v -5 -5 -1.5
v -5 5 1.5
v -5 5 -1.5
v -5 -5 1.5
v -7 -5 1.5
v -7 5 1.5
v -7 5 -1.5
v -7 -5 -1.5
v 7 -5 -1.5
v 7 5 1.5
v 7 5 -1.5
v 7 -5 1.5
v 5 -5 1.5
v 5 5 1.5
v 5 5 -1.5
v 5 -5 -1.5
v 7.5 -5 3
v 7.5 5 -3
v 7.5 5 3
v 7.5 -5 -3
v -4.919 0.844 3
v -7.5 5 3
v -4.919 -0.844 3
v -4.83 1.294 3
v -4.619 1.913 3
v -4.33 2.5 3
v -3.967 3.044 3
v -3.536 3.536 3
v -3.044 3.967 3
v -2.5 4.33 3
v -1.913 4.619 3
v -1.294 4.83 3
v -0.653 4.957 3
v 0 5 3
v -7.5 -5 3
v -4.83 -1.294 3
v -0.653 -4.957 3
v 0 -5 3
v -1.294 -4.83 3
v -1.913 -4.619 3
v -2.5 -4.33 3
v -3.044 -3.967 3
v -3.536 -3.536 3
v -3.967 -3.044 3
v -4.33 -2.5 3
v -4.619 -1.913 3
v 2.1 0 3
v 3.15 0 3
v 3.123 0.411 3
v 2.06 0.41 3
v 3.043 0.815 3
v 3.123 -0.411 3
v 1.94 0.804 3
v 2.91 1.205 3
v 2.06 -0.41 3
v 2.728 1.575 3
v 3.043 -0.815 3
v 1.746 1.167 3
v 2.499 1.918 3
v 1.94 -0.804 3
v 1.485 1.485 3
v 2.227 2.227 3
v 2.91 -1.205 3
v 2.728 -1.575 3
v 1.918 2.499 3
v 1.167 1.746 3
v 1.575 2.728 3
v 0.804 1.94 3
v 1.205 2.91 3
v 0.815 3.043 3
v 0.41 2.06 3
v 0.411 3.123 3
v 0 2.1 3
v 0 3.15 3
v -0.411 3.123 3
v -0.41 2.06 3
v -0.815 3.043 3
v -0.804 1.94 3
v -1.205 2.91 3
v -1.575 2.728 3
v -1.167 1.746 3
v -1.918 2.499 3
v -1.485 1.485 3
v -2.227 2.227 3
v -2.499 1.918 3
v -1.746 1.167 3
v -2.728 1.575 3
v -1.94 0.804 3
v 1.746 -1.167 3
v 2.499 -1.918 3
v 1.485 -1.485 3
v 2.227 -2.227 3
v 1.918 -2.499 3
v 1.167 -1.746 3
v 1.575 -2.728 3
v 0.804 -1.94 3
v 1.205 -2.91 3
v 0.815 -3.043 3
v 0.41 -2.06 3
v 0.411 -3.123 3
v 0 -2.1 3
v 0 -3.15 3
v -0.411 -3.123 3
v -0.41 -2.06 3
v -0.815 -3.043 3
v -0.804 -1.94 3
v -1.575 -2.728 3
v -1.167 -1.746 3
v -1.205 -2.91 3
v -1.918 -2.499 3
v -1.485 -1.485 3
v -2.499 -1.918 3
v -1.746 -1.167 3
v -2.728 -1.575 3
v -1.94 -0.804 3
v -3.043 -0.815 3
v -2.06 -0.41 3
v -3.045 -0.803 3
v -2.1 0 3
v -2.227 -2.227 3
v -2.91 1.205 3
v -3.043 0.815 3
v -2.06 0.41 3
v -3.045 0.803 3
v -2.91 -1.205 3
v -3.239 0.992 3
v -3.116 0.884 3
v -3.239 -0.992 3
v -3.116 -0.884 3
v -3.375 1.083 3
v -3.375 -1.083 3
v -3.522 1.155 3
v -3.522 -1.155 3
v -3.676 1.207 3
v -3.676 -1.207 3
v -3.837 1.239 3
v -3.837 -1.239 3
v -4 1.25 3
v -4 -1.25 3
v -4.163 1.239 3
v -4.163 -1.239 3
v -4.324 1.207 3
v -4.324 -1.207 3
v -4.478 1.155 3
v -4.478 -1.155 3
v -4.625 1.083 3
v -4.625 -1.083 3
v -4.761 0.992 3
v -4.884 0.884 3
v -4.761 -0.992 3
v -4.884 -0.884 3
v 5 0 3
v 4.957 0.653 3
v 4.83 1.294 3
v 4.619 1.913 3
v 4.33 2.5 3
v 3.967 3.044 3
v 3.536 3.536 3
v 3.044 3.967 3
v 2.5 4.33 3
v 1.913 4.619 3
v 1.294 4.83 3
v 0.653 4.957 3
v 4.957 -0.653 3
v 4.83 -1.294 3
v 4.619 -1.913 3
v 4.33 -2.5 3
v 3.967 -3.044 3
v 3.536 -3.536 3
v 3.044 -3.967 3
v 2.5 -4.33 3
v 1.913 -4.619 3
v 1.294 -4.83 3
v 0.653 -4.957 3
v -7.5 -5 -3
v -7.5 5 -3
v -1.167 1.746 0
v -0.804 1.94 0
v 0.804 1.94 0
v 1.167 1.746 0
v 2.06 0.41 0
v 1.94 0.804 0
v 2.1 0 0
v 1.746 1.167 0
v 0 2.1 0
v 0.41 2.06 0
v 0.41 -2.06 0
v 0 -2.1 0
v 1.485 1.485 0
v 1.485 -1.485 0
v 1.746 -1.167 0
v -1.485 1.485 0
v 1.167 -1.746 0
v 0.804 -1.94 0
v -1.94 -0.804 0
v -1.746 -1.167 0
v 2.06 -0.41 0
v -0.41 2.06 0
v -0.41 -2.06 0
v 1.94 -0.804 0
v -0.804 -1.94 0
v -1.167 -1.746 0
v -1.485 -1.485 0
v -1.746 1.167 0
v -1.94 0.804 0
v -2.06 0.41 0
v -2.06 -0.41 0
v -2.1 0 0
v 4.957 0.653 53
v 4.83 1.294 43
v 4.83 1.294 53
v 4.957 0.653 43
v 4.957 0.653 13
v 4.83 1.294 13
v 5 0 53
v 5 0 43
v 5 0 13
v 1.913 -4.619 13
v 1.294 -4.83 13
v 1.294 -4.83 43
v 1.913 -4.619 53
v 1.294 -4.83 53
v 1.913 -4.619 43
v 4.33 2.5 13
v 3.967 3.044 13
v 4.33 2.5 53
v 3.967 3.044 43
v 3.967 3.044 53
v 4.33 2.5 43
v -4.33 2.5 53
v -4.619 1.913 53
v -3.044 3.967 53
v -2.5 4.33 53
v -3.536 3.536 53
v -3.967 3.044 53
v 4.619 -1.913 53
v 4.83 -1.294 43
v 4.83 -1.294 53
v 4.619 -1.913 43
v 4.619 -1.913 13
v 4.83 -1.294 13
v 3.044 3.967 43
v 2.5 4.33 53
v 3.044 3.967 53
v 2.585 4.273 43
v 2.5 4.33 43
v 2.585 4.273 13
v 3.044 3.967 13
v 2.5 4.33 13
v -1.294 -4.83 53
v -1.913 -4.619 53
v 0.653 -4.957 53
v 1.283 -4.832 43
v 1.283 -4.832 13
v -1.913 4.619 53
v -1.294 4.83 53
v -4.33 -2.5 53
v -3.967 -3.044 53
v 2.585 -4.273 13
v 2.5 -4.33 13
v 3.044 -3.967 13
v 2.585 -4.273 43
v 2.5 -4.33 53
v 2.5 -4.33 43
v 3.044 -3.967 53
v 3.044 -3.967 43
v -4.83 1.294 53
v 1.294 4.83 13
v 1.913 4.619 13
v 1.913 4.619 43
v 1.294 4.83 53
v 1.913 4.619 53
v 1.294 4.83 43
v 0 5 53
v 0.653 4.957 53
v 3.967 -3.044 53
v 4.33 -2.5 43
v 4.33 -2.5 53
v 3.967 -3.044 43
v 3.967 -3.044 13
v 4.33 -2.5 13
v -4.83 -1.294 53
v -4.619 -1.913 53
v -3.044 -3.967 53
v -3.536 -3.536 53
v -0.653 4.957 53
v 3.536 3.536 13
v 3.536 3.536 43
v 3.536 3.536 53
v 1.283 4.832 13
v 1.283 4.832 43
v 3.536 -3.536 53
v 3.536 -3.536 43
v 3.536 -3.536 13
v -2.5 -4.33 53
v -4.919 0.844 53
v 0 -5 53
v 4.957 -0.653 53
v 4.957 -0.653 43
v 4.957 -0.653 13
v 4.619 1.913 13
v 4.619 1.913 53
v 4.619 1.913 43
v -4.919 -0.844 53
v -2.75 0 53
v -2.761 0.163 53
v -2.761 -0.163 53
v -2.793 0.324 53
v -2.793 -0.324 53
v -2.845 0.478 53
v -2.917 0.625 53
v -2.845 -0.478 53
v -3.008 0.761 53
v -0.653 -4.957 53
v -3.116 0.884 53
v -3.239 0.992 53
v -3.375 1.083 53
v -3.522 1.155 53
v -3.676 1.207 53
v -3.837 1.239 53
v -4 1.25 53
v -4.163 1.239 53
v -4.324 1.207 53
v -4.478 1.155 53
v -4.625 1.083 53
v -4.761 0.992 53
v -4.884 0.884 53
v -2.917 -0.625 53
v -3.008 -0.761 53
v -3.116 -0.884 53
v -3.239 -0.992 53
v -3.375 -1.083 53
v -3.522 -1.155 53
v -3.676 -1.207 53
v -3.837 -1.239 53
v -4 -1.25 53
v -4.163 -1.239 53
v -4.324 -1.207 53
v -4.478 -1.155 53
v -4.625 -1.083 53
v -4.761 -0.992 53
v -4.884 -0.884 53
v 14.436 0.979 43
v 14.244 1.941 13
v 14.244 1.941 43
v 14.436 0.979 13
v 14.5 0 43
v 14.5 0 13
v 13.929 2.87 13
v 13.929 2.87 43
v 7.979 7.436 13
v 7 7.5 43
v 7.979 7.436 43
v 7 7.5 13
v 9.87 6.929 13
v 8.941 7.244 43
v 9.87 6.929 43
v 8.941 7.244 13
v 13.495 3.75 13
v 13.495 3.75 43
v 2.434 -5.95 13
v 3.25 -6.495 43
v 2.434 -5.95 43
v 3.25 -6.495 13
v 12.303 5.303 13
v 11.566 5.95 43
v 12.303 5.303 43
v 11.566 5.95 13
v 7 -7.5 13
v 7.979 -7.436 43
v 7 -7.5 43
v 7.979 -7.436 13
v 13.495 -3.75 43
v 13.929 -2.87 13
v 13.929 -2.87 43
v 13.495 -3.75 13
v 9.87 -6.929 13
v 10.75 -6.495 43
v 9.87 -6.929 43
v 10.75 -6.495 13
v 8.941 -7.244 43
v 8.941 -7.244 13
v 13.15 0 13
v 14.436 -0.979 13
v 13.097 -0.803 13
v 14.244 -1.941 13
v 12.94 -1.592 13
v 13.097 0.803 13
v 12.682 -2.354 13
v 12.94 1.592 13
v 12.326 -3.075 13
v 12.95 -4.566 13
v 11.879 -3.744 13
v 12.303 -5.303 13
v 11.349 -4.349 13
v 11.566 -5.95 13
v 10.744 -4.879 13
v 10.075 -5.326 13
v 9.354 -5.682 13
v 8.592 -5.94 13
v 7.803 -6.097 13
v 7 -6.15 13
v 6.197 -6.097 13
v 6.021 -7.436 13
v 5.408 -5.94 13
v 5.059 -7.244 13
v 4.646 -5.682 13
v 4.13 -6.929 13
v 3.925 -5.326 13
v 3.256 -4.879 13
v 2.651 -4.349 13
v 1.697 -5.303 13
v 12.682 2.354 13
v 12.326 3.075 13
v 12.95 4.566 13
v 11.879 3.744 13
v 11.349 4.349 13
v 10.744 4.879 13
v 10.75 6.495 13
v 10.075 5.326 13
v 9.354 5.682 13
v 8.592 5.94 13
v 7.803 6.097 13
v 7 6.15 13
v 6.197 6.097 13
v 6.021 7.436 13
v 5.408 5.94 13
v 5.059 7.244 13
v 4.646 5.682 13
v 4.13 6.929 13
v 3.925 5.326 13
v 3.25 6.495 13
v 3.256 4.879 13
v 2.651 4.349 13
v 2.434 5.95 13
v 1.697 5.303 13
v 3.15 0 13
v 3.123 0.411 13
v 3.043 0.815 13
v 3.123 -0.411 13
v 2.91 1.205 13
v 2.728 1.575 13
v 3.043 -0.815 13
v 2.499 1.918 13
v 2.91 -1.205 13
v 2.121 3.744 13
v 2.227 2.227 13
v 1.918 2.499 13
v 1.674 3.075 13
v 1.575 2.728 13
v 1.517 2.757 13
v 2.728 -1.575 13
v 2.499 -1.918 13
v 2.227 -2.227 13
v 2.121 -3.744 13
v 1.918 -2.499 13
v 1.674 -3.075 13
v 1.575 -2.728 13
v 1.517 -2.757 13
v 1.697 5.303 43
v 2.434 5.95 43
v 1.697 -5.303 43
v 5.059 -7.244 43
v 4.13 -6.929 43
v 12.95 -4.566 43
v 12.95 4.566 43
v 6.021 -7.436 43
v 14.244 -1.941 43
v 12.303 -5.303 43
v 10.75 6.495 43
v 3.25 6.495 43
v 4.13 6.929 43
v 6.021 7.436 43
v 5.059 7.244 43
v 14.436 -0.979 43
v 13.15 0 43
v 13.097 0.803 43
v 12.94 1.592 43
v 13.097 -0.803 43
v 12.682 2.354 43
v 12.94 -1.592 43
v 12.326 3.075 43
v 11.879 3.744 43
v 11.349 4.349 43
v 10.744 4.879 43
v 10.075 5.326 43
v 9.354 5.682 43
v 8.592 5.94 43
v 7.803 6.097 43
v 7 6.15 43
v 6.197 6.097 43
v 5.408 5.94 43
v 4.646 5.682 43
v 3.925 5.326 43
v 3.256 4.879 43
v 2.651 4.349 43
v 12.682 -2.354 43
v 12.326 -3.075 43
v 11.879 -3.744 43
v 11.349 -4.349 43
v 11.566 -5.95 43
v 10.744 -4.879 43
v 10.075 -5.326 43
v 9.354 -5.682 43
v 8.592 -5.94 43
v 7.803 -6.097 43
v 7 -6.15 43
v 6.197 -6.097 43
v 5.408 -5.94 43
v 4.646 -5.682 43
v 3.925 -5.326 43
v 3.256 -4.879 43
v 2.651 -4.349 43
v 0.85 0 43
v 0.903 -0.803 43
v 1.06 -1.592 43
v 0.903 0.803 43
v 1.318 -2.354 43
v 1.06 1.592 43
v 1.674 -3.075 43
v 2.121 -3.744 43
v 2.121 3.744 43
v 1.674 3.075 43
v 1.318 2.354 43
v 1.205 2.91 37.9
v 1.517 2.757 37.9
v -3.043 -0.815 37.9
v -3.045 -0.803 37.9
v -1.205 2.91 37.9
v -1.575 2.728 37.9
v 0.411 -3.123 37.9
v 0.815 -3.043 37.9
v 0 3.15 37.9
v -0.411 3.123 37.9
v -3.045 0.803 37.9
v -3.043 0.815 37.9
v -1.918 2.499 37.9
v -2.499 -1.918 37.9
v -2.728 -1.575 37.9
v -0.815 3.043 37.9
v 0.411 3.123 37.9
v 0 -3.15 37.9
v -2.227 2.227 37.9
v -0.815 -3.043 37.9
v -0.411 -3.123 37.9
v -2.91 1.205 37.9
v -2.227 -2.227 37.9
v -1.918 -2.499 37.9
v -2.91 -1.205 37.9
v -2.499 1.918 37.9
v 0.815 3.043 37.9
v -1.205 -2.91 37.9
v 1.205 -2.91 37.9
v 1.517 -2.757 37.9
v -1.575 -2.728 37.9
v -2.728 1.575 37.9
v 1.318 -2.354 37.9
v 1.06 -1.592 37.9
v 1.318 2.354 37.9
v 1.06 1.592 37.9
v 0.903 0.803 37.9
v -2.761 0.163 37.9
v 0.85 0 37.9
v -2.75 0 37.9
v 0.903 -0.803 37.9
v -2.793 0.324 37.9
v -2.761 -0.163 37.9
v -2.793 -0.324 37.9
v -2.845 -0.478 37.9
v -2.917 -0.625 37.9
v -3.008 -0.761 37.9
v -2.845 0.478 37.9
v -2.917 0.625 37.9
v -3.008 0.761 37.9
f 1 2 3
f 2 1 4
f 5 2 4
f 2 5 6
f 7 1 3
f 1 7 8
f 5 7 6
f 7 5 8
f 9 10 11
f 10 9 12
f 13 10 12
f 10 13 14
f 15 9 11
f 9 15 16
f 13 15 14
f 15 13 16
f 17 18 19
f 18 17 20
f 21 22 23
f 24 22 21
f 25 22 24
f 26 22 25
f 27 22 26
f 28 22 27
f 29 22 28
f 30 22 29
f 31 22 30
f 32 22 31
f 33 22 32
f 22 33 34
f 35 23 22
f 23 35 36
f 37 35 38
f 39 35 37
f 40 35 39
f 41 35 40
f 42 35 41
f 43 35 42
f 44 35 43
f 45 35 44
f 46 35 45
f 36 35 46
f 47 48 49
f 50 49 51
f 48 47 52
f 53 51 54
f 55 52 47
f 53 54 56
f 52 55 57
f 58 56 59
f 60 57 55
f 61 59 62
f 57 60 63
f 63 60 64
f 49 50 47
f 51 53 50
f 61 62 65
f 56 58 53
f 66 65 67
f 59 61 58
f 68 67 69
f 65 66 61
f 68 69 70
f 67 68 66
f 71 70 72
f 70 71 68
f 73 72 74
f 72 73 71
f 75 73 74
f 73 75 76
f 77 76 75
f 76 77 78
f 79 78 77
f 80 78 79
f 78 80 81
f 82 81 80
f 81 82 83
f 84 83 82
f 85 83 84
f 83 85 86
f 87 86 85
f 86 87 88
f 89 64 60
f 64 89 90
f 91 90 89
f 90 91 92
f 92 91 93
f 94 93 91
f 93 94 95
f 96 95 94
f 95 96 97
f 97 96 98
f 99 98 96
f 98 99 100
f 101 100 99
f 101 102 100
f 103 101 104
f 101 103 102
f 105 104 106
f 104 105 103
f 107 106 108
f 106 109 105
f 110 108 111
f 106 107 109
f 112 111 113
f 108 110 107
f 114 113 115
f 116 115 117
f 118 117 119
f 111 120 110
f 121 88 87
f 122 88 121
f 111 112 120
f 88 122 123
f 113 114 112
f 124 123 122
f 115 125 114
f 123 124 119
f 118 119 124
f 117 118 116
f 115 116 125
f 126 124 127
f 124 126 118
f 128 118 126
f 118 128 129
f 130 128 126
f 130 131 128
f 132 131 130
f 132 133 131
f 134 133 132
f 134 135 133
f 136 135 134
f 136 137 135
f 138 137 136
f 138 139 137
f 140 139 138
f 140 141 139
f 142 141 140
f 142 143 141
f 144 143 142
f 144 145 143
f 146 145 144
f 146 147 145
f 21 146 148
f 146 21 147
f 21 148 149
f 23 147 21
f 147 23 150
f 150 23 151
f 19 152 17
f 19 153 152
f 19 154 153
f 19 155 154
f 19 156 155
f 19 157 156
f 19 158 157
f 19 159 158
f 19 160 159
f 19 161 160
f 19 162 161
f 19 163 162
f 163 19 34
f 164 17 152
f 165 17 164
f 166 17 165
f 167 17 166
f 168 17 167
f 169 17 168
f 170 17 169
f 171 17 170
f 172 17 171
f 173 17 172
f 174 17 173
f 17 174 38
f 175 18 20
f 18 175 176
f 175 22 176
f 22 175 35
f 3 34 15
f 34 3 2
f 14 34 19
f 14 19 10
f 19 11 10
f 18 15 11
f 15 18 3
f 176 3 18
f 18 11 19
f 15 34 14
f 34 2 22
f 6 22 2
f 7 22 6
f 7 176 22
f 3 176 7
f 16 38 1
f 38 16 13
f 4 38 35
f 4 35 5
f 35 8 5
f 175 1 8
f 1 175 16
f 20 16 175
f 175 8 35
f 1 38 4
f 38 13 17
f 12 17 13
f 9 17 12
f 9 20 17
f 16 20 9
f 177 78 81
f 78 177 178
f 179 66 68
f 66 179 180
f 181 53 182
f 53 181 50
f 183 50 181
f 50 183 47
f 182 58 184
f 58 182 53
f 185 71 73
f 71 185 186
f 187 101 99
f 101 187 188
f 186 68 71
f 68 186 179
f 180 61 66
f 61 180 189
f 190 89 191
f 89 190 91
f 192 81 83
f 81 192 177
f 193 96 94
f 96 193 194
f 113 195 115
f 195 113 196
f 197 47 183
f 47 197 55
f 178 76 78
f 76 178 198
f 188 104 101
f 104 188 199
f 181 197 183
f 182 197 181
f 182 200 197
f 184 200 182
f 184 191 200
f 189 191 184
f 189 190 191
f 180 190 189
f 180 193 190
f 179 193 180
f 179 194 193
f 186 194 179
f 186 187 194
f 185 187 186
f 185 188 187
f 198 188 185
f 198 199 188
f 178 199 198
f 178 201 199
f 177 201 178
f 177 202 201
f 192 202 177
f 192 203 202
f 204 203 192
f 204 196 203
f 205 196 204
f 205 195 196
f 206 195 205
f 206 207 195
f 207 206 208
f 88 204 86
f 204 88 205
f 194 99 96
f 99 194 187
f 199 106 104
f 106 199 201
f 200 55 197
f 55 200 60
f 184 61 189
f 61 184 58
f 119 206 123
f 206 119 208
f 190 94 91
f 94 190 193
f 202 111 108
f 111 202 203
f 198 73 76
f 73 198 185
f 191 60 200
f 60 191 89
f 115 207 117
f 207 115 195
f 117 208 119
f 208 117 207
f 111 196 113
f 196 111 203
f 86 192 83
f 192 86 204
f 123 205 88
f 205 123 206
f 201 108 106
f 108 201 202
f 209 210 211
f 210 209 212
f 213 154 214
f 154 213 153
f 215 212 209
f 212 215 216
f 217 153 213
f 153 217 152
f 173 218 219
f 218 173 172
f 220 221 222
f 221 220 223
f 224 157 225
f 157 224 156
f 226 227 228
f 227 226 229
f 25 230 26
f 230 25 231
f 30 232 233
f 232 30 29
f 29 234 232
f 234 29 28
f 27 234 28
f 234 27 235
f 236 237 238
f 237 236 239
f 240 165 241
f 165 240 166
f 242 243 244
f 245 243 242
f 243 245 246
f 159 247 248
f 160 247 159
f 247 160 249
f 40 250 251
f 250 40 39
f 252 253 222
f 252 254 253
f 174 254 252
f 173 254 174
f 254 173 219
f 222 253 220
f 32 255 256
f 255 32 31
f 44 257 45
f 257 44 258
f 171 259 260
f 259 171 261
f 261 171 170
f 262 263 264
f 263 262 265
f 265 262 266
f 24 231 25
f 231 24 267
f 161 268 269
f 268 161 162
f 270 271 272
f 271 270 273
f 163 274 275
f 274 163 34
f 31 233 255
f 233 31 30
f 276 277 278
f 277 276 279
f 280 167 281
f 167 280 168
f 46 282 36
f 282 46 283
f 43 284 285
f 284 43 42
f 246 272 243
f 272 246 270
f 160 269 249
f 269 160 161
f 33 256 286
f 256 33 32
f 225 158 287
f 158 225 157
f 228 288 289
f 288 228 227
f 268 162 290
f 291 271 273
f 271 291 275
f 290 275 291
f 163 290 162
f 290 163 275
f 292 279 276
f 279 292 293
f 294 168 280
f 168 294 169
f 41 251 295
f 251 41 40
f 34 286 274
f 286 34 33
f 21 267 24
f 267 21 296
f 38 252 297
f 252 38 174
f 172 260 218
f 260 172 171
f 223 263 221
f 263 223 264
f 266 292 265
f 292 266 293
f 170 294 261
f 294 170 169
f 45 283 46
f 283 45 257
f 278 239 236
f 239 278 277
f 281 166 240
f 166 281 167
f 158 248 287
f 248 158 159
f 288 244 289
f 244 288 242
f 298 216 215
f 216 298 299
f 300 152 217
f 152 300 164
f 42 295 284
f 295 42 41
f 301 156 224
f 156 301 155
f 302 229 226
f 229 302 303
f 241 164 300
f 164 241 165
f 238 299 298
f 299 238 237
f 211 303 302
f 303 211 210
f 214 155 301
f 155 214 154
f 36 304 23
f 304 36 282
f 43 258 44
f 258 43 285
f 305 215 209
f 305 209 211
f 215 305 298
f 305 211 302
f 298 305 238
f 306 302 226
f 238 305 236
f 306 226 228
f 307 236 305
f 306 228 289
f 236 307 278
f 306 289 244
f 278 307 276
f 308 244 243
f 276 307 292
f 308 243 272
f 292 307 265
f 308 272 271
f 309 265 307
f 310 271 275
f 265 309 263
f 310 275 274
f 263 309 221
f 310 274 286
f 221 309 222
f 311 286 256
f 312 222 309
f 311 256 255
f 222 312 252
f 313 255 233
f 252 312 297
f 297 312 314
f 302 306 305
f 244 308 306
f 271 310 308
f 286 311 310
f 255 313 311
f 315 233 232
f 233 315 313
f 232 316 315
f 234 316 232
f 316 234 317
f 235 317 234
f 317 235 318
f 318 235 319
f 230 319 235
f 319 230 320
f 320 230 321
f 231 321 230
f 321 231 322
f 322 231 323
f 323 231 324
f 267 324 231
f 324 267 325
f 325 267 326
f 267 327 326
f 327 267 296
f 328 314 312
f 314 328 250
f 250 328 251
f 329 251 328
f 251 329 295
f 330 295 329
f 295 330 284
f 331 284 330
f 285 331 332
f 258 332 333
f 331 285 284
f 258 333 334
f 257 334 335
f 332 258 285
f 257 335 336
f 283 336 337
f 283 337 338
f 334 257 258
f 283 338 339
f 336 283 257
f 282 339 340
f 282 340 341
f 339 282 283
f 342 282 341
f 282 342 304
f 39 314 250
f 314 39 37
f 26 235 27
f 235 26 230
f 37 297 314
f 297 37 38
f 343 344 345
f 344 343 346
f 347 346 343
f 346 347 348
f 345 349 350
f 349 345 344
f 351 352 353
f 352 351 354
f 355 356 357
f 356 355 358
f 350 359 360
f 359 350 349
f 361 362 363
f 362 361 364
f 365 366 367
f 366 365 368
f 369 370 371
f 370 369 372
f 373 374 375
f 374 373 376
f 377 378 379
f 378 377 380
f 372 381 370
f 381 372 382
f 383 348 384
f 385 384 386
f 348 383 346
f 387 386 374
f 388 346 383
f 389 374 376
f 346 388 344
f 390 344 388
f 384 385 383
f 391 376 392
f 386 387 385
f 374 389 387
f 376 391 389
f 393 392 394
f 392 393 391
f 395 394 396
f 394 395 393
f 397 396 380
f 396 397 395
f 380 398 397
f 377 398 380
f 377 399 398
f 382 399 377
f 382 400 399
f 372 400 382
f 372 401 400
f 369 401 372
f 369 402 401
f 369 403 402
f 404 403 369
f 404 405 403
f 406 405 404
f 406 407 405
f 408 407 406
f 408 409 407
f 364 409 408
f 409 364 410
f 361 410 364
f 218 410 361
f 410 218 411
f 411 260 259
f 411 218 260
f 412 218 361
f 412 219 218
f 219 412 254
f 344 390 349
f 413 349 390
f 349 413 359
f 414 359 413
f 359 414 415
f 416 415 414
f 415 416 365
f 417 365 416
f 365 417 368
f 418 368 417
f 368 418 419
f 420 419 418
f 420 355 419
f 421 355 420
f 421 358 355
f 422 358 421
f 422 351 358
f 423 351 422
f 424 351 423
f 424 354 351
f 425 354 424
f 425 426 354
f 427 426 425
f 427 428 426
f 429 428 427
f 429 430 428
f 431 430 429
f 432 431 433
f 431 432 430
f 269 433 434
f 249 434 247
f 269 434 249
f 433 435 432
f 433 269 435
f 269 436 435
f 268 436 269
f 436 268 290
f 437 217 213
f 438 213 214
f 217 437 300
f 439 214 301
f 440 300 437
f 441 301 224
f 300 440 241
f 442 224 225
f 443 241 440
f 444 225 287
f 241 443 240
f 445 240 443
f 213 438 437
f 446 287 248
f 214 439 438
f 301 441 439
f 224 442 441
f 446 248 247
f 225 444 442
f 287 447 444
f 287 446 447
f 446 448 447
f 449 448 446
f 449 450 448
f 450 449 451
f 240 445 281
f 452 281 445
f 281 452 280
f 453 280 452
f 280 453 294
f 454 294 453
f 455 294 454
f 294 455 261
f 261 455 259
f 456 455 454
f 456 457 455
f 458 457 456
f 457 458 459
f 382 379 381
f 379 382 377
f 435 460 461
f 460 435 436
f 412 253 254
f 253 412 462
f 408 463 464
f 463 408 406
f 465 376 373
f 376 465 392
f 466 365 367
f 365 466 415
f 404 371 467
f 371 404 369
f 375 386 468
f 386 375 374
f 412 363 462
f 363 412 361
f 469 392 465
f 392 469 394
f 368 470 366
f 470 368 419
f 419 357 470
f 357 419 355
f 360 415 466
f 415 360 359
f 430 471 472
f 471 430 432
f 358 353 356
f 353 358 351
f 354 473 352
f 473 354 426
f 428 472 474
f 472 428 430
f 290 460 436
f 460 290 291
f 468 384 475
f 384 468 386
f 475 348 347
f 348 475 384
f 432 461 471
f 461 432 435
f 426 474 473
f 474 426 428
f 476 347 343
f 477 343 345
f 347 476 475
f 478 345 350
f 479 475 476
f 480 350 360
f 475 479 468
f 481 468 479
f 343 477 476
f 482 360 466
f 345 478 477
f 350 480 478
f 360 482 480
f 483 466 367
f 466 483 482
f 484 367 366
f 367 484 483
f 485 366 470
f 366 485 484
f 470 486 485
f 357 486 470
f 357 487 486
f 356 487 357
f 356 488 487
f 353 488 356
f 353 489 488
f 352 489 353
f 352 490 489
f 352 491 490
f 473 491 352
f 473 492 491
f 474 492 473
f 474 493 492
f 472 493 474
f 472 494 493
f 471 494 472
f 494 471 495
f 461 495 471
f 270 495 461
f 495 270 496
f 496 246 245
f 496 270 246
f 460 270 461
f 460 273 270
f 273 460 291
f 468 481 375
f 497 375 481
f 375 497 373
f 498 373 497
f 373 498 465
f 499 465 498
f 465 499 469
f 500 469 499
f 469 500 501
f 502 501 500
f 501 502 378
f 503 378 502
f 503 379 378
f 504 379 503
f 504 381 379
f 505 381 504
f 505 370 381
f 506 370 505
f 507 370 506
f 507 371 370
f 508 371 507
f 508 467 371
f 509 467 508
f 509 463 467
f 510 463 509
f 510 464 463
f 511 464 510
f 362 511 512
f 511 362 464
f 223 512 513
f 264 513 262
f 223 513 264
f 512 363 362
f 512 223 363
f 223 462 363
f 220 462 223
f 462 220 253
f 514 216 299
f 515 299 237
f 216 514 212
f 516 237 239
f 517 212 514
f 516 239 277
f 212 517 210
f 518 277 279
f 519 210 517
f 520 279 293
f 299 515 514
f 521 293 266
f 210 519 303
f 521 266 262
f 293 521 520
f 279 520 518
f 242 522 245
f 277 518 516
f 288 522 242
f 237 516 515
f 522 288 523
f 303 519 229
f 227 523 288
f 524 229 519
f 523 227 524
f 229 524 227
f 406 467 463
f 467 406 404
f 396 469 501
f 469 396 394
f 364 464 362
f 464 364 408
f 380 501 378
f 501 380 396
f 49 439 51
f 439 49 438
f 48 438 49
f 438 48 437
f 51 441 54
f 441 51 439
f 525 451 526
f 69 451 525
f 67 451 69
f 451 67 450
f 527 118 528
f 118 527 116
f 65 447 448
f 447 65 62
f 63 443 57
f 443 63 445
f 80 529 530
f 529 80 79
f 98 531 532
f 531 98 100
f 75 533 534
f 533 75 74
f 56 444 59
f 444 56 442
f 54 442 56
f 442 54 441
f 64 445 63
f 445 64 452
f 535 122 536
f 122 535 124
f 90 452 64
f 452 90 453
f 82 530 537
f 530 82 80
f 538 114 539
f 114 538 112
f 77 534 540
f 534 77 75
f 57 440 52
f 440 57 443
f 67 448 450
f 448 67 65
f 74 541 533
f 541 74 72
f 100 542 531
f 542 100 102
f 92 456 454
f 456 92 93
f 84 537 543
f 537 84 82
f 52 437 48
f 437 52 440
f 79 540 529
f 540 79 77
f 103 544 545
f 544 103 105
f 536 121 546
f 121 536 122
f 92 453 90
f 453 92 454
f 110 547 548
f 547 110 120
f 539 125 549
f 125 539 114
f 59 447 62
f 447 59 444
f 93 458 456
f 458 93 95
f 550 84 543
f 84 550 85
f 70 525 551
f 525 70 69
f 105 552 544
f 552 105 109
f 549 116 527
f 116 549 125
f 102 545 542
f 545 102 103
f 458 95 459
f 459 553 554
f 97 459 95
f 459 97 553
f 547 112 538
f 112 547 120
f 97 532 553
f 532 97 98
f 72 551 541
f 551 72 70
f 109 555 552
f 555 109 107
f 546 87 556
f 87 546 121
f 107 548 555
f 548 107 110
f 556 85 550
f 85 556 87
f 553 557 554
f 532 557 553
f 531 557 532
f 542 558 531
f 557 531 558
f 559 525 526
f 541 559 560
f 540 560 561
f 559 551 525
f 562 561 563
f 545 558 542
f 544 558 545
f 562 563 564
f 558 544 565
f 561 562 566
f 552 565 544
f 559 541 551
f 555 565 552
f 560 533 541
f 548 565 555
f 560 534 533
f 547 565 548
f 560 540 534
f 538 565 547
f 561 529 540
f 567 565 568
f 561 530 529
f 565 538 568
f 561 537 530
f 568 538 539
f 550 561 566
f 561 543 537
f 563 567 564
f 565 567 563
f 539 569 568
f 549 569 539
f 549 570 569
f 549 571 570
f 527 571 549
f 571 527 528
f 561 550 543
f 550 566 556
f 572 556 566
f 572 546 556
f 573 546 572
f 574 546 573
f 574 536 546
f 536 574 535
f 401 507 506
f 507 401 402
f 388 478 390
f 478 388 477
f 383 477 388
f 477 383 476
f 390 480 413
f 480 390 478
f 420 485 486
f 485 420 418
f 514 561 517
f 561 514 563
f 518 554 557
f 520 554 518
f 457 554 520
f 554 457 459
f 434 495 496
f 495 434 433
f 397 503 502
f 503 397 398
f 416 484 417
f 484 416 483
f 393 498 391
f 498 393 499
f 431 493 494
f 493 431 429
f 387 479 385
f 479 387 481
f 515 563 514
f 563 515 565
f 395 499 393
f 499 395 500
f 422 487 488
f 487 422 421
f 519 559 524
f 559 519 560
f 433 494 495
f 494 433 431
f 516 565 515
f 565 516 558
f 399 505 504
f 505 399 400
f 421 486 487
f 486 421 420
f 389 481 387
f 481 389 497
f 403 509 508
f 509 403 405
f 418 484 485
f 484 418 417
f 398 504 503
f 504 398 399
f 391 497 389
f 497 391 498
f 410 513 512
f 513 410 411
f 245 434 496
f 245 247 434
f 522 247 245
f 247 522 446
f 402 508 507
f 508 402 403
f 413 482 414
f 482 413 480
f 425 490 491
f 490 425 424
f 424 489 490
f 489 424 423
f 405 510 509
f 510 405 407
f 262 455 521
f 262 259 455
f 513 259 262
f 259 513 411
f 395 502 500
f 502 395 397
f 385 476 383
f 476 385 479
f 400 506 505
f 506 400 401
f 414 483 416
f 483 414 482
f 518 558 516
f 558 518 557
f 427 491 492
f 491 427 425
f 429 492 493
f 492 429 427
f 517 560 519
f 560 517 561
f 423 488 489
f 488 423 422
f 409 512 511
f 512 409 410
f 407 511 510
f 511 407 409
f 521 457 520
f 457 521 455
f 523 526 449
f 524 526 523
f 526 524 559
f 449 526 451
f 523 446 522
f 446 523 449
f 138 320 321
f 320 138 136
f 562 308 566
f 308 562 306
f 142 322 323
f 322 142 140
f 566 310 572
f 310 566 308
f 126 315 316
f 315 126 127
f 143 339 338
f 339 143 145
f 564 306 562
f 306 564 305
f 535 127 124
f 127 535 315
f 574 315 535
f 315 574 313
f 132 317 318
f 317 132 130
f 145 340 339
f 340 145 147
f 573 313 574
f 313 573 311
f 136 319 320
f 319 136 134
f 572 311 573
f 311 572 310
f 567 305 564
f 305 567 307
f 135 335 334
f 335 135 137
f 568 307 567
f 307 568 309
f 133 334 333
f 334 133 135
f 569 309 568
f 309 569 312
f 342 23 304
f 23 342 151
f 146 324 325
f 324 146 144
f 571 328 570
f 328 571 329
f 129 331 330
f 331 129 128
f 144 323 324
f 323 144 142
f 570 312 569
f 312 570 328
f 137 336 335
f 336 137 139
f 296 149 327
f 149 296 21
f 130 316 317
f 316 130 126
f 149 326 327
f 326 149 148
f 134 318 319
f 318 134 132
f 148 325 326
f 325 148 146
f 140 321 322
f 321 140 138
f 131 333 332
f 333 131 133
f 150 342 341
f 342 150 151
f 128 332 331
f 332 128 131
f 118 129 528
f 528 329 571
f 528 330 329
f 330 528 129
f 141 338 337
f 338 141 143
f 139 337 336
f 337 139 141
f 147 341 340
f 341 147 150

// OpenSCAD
// AstraAnt Tool: Bioreactor Sampling Probe
// Print body in PETG. pH electrode and turbidity sensor purchased separately.
// Syringe barrel is a standard 5ml lab syringe body.
//
// Print orientation: mount face down
// Supports: needed for probe tip

$fn = 48;


// Universal magnetic mount interface
// Clips between ant mandibles, held by neodymium magnets
module magnetic_mount(width=15, depth=10, magnet_d=4) {
    difference() {
        // Mount body
        cube([width, depth, 6], center=true);
        // Magnet pocket (recessed)
        translate([0, 0, 1.5])
            cylinder(d=4+0.2, h=3, center=true, $fn=32);
        // Mandible grip grooves (two channels for ant mandibles)
        for (side = [-1, 1]) {
            translate([side * (width/2 - 1.5), 0, 0])
                cube([2, depth+1, 3], center=true);
        }
    }
}


// Parameters
body_diameter = 10;
body_length = 50;
probe_tip_length = 15;
syringe_diameter = 12;    // 5ml syringe barrel OD
sensor_pocket_d = 6;      // pH electrode diameter

module probe_body() {
    difference() {
        union() {
            // Main body
            cylinder(d=body_diameter, h=body_length);
            // Syringe holder (side mount)
            translate([body_diameter/2 + 2, 0, body_length/2])
                cylinder(d=syringe_diameter + 3, h=body_length * 0.6, center=true);
        }
        // pH electrode pocket
        translate([0, 0, -0.1])
            cylinder(d=sensor_pocket_d + 0.3, h=body_length * 0.7);
        // Turbidity sensor window
        translate([body_diameter/2 - 1, 0, body_length * 0.3])
            cube([3, 4, 4], center=true);
        // Syringe barrel hole
        translate([body_diameter/2 + 2, 0, body_length * 0.2])
            cylinder(d=syringe_diameter + 0.3, h=body_length * 0.6);
        // Wire channel (runs up the back)
        translate([-body_diameter/2 + 1, 0, 0])
            cylinder(d=2.5, h=body_length + 1);
    }
}

module sampling_probe_assembly() {
    magnetic_mount();
    translate([0, 0, 3])
        probe_body();
}

sampling_probe_assembly();
